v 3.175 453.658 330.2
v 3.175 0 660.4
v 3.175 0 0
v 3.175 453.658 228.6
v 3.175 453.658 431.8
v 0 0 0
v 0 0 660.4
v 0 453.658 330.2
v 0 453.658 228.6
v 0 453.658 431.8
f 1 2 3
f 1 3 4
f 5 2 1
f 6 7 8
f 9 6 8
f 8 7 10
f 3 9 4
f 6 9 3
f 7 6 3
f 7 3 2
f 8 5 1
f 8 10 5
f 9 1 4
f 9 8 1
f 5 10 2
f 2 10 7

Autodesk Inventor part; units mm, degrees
ref_plane "YZ Plane" through (0, 0, 0) normal (1, 0, 0) x (0, 1, 0)
ref_plane "XZ Plane" through (0, 0, 0) normal (0, 1, 0) x (-1, 0, 0)
ref_plane "XY Plane" through (0, 0, 0) normal (0, 0, 1) x (1, 0, 0)
sketch "Sketch1" plane through (0, 0, 0) normal (1, 0, 0) x (0, 1, 0)
  line L0 (0, 0) -> (0, 660.4)
  line L1 (0, 330.2) -> (453.6585, 330.2) construction
  line L2 (453.6585, 431.8) -> (453.6585, 330.2)
  line L3 (453.6585, 330.2) -> (453.6585, 228.6)
  line L4 (453.6585, 431.8) -> (0, 660.4)
  line L5 (453.6585, 228.6) -> (0, 0)
  dimension "d0" = 660.4
  dimension "d4" = 203.2
  dimension "d29" = 228.6
  dimension "d31" = 508
  dimension "d32" = 453.6585
extrude "Extrusion1" add sketch "Sketch1" along normal blind 3.175
properties part number "Polycarb Side1 Pannel" material "Polycarbonate, Clear"
